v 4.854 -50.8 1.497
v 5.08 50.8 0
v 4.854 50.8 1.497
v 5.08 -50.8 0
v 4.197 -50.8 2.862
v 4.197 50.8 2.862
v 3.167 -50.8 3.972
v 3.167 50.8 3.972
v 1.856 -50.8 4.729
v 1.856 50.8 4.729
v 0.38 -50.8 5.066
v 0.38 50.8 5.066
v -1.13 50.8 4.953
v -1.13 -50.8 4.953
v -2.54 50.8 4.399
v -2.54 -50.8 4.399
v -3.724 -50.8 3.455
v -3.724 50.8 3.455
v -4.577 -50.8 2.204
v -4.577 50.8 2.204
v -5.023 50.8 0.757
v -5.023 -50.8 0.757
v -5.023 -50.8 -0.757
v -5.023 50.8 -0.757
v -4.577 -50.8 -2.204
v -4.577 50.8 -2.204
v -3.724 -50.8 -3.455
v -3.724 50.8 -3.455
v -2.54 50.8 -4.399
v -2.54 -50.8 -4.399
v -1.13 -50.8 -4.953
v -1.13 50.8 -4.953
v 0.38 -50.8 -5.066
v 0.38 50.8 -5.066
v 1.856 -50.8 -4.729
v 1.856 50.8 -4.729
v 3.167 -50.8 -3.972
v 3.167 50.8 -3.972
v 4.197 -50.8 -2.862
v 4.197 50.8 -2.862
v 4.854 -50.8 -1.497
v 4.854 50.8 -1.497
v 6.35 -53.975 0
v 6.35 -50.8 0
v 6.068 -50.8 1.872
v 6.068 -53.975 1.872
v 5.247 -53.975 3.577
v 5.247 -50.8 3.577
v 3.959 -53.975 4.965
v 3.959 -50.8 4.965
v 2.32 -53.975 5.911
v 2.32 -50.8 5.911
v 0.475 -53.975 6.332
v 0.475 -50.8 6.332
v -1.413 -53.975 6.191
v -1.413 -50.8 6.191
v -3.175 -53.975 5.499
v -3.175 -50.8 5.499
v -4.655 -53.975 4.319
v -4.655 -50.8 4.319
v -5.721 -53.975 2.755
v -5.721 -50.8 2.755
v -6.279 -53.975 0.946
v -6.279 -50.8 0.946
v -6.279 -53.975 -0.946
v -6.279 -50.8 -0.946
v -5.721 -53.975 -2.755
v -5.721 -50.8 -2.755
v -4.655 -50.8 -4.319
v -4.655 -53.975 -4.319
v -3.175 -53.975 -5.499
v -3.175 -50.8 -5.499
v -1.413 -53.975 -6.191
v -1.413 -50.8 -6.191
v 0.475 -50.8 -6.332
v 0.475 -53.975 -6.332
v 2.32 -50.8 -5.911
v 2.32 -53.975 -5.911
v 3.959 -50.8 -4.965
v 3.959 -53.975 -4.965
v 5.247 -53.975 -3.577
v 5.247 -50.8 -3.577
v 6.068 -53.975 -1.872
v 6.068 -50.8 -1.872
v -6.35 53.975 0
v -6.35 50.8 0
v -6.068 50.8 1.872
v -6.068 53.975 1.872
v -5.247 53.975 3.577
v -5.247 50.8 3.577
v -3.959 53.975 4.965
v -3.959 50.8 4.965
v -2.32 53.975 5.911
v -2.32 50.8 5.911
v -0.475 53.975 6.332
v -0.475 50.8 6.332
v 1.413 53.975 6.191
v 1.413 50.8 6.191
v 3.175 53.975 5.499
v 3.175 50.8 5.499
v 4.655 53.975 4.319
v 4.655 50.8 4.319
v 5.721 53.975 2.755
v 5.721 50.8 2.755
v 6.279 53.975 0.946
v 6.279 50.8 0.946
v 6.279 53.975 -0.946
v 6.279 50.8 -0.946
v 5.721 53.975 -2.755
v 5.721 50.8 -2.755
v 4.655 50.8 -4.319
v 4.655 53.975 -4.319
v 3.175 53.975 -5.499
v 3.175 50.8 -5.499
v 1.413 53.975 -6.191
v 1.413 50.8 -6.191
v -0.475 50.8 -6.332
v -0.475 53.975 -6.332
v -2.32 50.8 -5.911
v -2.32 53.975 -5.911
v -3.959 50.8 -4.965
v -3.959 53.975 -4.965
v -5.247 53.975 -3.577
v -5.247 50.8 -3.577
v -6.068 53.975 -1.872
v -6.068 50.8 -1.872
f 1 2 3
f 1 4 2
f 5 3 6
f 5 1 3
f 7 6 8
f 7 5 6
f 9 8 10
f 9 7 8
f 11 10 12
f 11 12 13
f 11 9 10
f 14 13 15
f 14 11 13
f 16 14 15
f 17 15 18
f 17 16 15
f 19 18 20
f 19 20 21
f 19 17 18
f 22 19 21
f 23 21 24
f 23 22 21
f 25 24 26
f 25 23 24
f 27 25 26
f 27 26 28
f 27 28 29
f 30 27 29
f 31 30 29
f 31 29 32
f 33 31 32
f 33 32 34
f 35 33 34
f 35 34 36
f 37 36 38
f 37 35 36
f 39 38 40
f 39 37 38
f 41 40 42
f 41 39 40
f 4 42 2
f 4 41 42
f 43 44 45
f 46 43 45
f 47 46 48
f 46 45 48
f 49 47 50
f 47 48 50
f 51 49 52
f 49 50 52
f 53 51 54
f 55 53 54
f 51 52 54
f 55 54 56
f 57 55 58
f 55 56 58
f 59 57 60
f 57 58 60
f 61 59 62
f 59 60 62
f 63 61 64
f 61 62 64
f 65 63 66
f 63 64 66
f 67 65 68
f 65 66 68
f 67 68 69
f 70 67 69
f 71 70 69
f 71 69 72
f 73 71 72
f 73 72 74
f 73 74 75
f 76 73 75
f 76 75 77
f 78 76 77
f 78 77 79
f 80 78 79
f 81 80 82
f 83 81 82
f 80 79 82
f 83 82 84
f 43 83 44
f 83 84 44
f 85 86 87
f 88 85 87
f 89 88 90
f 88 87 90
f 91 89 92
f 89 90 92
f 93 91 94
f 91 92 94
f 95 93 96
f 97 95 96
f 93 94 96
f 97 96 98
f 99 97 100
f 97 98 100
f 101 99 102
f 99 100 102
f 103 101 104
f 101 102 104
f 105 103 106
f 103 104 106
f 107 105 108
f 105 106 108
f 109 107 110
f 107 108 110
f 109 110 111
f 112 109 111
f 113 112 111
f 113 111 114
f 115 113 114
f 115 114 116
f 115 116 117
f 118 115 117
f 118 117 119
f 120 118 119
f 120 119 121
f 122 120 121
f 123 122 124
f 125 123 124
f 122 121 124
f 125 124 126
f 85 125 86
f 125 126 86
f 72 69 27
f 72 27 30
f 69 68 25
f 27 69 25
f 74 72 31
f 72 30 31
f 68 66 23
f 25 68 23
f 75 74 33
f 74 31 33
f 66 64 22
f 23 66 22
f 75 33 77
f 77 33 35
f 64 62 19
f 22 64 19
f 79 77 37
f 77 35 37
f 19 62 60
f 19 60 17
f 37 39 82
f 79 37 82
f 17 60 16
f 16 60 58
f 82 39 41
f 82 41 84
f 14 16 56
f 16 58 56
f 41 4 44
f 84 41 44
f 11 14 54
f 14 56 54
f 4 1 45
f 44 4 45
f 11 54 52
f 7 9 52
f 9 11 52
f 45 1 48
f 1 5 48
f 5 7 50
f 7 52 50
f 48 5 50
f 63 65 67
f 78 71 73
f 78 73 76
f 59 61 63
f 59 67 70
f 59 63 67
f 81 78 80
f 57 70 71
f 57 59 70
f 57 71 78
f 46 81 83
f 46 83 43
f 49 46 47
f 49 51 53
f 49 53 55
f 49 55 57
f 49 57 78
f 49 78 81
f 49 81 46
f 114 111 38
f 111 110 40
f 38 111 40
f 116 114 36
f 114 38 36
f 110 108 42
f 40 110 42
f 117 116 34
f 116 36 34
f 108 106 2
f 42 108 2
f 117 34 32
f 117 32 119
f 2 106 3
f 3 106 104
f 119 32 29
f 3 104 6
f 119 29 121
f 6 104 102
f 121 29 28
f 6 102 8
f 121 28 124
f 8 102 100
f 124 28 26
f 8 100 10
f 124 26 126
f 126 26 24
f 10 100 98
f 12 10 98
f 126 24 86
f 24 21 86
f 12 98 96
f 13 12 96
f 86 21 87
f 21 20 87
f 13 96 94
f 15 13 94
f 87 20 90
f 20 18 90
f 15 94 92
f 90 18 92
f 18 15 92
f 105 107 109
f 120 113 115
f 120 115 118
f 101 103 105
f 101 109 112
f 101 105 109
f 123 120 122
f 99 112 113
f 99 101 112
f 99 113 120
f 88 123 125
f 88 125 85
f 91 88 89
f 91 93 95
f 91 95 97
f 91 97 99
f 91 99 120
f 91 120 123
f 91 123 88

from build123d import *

# Parameters (mm, degrees)
F0_R     = 5.08
F1_DEPTH = 50.8
F2_R     = 6.35
F3_DEPTH = 3.175
F4_R     = 6.35
F5_DEPTH = 3.175


with BuildPart() as f1:
    # F0 (on Front) → F1 (new body, symmetric)
    with BuildSketch(Plane.XZ):
        Circle(F0_R)
    extrude(amount=F1_DEPTH, both=True)

    # F2 (on face) → F3 (join)
    with BuildSketch(Plane.XZ.offset(50.8)):
        Circle(F2_R)
    extrude(amount=F3_DEPTH)

    # F4 (on face) → F5 (join)
    with BuildSketch(Plane(origin=(0, 50.8, 0), x_dir=(-1, 0, 0), z_dir=(0, 1, 0))):
        Circle(F4_R)
    extrude(amount=F5_DEPTH)


solid = f1.part
